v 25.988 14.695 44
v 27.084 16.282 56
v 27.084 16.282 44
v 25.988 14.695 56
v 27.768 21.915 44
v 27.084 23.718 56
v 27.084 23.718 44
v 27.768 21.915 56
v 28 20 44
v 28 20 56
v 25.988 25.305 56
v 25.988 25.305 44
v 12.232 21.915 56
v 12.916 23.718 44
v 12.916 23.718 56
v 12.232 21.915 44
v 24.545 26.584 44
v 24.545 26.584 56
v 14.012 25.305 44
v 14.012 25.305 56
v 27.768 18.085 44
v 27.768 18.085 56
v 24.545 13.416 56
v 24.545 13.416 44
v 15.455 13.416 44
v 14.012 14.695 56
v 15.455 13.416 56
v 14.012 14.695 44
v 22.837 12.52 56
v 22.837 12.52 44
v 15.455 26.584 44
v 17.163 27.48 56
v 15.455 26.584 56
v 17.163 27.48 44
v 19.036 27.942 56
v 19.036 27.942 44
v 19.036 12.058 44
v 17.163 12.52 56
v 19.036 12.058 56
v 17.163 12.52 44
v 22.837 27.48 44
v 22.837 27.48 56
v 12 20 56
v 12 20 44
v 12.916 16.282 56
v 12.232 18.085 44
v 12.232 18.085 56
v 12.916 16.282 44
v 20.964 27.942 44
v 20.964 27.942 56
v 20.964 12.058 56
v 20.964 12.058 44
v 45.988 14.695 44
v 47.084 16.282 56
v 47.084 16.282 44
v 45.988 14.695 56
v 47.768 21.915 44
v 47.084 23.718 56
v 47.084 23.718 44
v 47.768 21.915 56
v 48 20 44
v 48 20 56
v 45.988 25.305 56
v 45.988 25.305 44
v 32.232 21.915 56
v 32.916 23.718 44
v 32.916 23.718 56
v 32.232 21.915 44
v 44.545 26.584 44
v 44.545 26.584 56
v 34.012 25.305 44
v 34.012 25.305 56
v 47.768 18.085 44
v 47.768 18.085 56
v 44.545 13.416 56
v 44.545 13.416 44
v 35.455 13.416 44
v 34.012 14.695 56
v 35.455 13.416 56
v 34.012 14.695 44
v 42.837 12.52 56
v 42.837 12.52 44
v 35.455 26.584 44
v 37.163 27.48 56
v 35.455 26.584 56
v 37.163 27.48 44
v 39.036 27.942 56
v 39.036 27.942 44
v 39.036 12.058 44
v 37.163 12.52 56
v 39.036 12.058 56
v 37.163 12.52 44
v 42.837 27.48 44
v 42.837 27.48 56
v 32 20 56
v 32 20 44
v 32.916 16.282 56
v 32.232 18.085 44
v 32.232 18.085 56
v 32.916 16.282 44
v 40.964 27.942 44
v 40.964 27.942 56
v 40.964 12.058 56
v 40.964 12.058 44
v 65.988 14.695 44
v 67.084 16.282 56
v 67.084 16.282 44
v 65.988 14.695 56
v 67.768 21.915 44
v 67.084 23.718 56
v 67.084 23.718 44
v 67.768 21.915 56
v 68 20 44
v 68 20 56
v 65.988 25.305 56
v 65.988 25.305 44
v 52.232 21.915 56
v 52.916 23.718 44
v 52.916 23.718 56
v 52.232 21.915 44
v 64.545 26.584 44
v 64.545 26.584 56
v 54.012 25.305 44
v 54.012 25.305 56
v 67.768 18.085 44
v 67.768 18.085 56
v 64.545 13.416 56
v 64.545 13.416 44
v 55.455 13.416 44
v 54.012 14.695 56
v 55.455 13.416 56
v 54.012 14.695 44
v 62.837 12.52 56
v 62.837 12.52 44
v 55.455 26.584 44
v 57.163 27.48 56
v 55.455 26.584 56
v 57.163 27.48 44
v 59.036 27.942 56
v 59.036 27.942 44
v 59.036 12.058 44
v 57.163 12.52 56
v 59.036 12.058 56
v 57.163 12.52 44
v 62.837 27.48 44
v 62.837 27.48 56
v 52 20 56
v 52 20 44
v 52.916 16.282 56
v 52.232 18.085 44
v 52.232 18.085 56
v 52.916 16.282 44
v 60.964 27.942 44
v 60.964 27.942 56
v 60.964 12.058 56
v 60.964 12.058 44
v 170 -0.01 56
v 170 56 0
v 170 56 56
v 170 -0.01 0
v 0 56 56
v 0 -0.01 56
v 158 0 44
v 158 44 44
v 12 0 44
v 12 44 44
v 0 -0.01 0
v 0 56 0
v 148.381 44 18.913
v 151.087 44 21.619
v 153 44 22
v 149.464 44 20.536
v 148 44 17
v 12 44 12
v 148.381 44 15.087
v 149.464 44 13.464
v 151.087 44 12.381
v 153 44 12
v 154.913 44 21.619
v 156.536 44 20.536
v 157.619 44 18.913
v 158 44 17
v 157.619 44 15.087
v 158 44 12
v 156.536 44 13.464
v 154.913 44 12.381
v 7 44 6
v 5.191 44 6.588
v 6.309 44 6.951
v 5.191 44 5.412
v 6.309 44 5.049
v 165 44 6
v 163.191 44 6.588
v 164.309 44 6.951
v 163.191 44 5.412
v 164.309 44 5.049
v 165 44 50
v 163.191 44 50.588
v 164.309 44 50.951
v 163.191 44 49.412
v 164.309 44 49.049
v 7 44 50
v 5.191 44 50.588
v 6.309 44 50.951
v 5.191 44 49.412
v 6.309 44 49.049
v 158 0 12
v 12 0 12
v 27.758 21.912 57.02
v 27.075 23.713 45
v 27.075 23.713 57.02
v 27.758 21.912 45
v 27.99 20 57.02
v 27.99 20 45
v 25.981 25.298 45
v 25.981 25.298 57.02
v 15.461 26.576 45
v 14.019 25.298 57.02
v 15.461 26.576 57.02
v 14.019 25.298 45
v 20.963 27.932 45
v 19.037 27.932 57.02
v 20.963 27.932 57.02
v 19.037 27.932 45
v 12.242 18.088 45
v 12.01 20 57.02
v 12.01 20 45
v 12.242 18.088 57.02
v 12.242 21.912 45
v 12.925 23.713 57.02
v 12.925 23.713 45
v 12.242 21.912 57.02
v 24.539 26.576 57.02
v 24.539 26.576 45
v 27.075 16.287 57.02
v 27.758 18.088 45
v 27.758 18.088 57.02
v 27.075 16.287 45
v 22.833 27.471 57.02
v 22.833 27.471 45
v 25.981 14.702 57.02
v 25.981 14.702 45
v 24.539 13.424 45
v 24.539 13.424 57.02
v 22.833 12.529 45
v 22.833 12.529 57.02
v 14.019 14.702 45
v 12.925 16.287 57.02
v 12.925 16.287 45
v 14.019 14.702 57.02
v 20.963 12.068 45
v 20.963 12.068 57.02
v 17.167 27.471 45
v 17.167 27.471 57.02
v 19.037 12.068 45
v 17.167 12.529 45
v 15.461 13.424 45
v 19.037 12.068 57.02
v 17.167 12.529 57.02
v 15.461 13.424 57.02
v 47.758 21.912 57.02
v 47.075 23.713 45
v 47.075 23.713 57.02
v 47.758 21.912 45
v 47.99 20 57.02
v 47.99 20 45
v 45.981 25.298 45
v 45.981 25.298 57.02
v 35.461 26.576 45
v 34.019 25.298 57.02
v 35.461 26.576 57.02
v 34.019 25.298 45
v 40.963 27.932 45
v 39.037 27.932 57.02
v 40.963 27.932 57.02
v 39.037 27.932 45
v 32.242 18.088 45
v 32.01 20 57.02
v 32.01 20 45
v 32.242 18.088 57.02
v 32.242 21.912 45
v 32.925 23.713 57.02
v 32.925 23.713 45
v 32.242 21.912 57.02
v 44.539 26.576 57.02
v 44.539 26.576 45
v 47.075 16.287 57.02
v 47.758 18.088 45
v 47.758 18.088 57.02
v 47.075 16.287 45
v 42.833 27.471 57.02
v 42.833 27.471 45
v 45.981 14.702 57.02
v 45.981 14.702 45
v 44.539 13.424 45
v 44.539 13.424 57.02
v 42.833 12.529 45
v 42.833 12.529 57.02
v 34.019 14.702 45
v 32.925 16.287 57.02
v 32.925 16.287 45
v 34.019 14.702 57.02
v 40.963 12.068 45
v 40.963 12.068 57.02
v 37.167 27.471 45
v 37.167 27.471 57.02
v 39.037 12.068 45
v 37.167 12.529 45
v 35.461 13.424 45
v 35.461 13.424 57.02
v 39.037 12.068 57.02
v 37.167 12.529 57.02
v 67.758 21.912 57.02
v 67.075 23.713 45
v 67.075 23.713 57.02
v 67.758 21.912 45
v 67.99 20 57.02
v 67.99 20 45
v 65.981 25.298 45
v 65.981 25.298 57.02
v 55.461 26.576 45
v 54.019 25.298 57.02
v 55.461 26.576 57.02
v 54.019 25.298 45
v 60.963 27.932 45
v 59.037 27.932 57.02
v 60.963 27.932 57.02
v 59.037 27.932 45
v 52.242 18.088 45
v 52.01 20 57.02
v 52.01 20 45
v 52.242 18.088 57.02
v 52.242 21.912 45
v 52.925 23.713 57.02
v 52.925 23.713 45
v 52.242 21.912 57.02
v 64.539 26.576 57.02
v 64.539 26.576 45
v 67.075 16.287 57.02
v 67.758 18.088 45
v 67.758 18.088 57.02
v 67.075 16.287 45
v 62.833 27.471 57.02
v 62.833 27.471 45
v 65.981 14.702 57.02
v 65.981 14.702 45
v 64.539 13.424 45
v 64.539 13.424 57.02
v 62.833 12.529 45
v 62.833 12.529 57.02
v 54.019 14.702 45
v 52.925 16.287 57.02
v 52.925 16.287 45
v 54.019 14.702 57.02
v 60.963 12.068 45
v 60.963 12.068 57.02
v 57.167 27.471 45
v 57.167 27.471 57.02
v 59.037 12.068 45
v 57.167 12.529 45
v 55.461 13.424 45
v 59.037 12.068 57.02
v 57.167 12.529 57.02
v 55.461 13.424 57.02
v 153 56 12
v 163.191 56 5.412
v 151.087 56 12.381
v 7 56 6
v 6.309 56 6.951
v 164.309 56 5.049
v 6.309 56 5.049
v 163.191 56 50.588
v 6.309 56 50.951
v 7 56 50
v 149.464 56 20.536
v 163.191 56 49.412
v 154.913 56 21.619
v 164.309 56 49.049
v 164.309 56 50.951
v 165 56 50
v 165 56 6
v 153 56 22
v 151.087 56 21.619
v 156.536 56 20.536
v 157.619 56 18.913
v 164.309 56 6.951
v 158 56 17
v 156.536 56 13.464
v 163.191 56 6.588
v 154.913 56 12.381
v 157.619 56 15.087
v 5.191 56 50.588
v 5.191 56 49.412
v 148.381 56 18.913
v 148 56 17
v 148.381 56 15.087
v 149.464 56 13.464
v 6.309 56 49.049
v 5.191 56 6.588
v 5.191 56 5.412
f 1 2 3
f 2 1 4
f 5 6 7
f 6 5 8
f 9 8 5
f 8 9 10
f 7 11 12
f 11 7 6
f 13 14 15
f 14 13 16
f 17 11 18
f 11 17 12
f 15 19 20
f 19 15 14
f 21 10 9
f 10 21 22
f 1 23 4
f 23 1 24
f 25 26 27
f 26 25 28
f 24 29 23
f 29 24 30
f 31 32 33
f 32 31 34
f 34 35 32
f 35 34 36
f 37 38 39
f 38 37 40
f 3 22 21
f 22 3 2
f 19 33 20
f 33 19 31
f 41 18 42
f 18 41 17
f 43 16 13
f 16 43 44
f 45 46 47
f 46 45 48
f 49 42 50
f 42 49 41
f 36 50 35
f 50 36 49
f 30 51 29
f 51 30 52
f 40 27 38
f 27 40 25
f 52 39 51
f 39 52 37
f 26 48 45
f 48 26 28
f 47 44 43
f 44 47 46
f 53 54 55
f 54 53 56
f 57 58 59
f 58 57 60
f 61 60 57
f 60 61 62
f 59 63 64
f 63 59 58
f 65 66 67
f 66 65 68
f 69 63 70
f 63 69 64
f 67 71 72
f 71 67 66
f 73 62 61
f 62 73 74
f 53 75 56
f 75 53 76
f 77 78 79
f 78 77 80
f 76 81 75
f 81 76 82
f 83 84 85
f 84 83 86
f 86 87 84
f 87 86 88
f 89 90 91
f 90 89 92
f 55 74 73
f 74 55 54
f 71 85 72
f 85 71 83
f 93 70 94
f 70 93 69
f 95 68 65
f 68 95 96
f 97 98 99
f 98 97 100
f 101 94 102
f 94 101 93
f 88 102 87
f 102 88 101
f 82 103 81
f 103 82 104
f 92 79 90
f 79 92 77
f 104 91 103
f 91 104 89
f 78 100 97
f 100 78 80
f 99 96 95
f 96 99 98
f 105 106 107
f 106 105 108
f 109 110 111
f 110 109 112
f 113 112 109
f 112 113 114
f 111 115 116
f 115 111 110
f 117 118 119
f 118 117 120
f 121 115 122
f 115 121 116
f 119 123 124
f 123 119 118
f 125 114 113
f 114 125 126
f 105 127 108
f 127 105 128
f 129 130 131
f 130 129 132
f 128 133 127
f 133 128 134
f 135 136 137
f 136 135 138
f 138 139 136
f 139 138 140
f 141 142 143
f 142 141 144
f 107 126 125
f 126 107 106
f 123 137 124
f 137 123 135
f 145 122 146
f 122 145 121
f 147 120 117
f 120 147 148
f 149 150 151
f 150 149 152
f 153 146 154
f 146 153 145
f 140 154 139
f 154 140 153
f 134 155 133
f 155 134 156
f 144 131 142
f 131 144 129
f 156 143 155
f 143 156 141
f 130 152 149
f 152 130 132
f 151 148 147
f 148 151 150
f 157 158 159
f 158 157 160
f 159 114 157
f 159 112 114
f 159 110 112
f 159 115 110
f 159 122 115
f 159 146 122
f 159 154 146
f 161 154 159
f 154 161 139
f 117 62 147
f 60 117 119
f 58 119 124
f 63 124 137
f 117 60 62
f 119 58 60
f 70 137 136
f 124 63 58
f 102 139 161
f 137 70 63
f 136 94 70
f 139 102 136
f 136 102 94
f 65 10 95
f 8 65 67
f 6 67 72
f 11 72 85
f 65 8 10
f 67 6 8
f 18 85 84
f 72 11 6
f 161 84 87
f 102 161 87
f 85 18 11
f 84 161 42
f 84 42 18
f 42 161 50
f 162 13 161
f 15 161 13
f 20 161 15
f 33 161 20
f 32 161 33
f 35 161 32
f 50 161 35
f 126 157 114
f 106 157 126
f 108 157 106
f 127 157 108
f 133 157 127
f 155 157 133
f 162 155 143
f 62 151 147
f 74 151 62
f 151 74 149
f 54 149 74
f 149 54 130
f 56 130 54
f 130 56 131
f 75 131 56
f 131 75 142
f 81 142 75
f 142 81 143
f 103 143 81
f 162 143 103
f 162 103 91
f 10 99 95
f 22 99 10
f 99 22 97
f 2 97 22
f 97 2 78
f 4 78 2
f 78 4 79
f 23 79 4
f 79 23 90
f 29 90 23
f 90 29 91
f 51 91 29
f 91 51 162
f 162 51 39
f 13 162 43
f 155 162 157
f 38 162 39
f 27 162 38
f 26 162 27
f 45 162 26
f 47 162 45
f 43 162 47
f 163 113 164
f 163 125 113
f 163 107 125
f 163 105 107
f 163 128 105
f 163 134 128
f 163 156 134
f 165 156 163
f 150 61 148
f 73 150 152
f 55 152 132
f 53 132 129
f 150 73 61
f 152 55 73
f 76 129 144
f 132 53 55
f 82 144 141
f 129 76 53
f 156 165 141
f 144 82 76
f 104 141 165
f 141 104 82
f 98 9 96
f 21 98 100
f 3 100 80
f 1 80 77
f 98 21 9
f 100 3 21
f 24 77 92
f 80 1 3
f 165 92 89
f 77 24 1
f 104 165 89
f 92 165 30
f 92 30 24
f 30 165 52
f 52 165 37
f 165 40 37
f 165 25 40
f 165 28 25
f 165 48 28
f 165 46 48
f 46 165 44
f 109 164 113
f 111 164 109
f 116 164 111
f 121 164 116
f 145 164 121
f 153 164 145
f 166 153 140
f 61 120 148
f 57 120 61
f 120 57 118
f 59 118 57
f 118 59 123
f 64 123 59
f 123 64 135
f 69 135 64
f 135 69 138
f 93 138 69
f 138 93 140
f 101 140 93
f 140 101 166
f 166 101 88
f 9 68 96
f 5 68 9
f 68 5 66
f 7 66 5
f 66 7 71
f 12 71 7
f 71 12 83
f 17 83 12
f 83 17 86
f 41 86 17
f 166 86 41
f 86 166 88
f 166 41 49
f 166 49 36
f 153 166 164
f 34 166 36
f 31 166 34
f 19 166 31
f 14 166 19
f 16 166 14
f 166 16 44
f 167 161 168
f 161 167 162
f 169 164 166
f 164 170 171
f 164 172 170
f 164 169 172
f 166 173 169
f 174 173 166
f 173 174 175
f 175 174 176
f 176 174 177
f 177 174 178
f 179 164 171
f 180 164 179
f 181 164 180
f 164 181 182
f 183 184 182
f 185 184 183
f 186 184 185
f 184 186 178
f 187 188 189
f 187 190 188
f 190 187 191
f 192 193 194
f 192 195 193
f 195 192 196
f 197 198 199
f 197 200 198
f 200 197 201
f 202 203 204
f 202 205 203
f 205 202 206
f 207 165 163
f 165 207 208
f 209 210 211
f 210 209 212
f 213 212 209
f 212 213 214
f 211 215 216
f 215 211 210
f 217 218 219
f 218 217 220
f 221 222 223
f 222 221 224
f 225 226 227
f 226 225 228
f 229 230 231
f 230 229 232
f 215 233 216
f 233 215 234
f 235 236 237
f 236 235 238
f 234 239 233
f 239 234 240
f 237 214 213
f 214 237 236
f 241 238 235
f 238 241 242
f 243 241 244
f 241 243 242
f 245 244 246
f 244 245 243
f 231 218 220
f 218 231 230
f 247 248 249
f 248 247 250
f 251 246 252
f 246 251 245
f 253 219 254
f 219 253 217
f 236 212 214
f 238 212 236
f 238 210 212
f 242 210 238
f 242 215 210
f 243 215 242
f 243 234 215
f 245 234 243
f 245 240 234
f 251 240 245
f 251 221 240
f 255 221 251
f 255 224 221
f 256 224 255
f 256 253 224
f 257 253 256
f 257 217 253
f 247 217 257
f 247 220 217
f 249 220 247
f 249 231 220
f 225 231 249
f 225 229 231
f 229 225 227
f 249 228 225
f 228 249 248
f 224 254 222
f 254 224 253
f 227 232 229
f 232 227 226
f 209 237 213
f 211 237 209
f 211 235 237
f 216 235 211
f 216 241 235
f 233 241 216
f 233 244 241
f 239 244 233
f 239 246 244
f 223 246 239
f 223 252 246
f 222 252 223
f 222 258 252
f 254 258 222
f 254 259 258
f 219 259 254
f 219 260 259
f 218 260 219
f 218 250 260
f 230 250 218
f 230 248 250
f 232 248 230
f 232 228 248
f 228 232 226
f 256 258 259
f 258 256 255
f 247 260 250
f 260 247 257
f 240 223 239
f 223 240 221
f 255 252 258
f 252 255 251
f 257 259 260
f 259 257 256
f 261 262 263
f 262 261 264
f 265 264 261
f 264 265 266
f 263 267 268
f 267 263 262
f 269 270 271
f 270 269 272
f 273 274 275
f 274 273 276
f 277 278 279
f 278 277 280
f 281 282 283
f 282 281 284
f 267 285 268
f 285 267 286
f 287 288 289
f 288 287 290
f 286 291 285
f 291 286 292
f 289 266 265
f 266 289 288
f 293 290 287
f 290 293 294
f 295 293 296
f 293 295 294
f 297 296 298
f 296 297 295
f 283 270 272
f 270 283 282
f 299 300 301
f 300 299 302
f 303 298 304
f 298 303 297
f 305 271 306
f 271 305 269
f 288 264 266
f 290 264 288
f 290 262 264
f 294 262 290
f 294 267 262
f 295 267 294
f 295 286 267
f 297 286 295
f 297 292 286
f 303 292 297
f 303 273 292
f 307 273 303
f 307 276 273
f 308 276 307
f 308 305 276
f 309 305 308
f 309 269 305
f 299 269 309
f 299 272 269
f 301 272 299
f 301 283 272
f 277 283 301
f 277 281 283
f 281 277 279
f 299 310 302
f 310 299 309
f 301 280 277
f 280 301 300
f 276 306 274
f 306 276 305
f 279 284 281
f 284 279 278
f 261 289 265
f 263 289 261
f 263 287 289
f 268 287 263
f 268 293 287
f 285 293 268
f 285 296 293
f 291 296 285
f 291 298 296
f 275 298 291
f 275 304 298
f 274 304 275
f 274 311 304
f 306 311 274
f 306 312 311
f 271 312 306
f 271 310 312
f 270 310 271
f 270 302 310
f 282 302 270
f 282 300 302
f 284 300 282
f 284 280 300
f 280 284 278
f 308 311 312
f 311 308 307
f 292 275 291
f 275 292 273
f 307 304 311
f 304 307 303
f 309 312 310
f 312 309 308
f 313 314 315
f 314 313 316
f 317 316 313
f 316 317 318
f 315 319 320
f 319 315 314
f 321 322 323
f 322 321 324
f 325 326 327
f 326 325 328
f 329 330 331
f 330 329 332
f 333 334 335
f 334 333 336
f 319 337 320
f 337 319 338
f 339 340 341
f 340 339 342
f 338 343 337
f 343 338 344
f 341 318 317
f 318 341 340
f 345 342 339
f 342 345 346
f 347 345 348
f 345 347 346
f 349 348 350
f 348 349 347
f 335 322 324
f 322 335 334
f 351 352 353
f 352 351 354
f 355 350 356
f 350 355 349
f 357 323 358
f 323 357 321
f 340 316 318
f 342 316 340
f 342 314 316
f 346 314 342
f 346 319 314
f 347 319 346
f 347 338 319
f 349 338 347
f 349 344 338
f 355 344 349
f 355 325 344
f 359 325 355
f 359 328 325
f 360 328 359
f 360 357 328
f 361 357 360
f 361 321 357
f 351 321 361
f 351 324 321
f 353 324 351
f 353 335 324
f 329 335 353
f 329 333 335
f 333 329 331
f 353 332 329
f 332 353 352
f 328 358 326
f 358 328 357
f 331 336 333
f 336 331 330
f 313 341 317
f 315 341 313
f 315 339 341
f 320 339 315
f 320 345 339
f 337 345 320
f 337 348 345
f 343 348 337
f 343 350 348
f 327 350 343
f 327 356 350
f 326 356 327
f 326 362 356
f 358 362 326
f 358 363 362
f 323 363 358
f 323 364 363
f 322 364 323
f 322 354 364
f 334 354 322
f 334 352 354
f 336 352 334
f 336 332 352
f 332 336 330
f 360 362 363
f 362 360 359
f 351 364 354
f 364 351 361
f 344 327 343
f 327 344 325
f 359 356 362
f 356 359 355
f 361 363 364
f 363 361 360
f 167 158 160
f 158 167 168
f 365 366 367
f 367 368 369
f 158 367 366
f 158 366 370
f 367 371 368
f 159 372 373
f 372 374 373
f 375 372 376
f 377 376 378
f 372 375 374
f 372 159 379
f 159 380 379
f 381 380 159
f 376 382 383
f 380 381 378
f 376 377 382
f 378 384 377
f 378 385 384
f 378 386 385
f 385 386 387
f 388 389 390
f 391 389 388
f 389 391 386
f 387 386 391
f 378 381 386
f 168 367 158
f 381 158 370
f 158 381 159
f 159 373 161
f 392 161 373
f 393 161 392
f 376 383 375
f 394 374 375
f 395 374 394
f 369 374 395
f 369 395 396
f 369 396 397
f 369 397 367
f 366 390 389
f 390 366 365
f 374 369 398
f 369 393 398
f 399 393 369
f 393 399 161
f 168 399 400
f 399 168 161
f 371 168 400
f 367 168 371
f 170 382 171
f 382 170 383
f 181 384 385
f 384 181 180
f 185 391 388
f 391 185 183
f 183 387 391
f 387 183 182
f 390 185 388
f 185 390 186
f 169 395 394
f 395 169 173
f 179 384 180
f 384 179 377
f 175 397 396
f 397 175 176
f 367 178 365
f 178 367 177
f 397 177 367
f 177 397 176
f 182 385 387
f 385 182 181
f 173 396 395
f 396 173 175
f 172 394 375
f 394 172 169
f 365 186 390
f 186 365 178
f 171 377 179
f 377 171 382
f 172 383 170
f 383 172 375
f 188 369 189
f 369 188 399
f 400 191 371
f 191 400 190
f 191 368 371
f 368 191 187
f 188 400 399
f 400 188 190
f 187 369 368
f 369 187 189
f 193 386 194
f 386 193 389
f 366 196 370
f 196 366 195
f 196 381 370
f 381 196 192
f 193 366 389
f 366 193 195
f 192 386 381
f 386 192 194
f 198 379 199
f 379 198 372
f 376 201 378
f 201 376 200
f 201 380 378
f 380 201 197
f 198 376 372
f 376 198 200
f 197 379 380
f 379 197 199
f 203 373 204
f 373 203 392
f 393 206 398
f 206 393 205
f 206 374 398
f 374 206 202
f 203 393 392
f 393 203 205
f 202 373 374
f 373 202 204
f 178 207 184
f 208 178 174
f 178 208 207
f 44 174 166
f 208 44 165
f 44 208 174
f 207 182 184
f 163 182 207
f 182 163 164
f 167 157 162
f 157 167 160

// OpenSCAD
VENEER_WIDTH = 12;
CONTAINER_HEIGHT = 32;
CONTAINER_WIDTH = 146;
BUTTON_R = 8;
BUTTON_X1 = VENEER_WIDTH + BUTTON_R + 0;
BUTTON_Y = VENEER_WIDTH + 0;
BUTTON_DIST = 20;
POWER_R = 5;
EPSILON = 0.01;

// bottom
cube([CONTAINER_WIDTH + 2 * VENEER_WIDTH, CONTAINER_HEIGHT + VENEER_WIDTH, VENEER_WIDTH]);
echo("Bottom/top: ", CONTAINER_WIDTH + 2 * VENEER_WIDTH, "x", CONTAINER_HEIGHT + VENEER_WIDTH);

// left
translate([0, 0, VENEER_WIDTH]) {
    cube([VENEER_WIDTH, CONTAINER_HEIGHT + VENEER_WIDTH, CONTAINER_HEIGHT]);
}
echo("Left/right: ", CONTAINER_HEIGHT + VENEER_WIDTH, "x", CONTAINER_HEIGHT);
    
// right    
translate([CONTAINER_WIDTH+VENEER_WIDTH, 0, VENEER_WIDTH]) {    
    cube([VENEER_WIDTH, CONTAINER_HEIGHT + VENEER_WIDTH, CONTAINER_HEIGHT]);
}

// top
translate([0, 0, CONTAINER_HEIGHT + VENEER_WIDTH]) {
    difference() {
        // top
        cube([CONTAINER_WIDTH + 2 * VENEER_WIDTH, CONTAINER_HEIGHT + VENEER_WIDTH, VENEER_WIDTH]);
        
        // button holes
        for (i = [0:2]) {
            translate([BUTTON_X1 + i * BUTTON_DIST, BUTTON_R + BUTTON_Y, -EPSILON]) {
                cylinder(h=VENEER_WIDTH + 2*EPSILON, r=BUTTON_R);
            }
        }
    }
    
    // buttons
    for (i = [0:2]) {
        translate([BUTTON_X1 + i * BUTTON_DIST, BUTTON_Y + BUTTON_R, 1]) {
            color("#ffff99") {
                cylinder(h=VENEER_WIDTH + 2*EPSILON, r=BUTTON_R - EPSILON);
            }
        }
    }
}

// backside
translate([0, CONTAINER_HEIGHT + VENEER_WIDTH, 0]) {
    difference() {
        cube([CONTAINER_WIDTH + 2 * VENEER_WIDTH, VENEER_WIDTH, CONTAINER_HEIGHT + 2 * VENEER_WIDTH]);
        translate([CONTAINER_WIDTH + VENEER_WIDTH - POWER_R, -EPSILON, VENEER_WIDTH + POWER_R]) {
            rotate([270, 0, 0]) {
                cylinder(h=VENEER_WIDTH + 2 * EPSILON, r=POWER_R);
            }
        }
        translate([VENEER_WIDTH/2, 0, VENEER_WIDTH/2]) {
            rotate([270, 0, 0]) {
                cylinder(h=VENEER_WIDTH + 2 * EPSILON, r=1);
            }
        }
        translate([CONTAINER_WIDTH+VENEER_WIDTH*1.5, 0, VENEER_WIDTH/2]) {
            rotate([270, 0, 0]) {
                cylinder(h=VENEER_WIDTH + 2 * EPSILON, r=1);
            }
        }
        translate([CONTAINER_WIDTH+VENEER_WIDTH*1.5, 0, CONTAINER_HEIGHT + VENEER_WIDTH * 1.5]) {
            rotate([270, 0, 0]) {
                cylinder(h=VENEER_WIDTH + 2 * EPSILON, r=1);
            }
        }
        translate([VENEER_WIDTH/2, 0, CONTAINER_HEIGHT + VENEER_WIDTH * 1.5]) {
            rotate([270, 0, 0]) {
                cylinder(h=VENEER_WIDTH + 2 * EPSILON, r=1);
            }
        }
    }
}
echo("Back: ", CONTAINER_WIDTH + 2 * VENEER_WIDTH, "x", CONTAINER_HEIGHT + 2 * VENEER_WIDTH);


// front film
translate([0, -EPSILON, 0]) {
    color("#000000", 0.4) {
        cube([CONTAINER_WIDTH + 2 * VENEER_WIDTH, EPSILON, CONTAINER_HEIGHT + 2 * VENEER_WIDTH]);
    }
}
